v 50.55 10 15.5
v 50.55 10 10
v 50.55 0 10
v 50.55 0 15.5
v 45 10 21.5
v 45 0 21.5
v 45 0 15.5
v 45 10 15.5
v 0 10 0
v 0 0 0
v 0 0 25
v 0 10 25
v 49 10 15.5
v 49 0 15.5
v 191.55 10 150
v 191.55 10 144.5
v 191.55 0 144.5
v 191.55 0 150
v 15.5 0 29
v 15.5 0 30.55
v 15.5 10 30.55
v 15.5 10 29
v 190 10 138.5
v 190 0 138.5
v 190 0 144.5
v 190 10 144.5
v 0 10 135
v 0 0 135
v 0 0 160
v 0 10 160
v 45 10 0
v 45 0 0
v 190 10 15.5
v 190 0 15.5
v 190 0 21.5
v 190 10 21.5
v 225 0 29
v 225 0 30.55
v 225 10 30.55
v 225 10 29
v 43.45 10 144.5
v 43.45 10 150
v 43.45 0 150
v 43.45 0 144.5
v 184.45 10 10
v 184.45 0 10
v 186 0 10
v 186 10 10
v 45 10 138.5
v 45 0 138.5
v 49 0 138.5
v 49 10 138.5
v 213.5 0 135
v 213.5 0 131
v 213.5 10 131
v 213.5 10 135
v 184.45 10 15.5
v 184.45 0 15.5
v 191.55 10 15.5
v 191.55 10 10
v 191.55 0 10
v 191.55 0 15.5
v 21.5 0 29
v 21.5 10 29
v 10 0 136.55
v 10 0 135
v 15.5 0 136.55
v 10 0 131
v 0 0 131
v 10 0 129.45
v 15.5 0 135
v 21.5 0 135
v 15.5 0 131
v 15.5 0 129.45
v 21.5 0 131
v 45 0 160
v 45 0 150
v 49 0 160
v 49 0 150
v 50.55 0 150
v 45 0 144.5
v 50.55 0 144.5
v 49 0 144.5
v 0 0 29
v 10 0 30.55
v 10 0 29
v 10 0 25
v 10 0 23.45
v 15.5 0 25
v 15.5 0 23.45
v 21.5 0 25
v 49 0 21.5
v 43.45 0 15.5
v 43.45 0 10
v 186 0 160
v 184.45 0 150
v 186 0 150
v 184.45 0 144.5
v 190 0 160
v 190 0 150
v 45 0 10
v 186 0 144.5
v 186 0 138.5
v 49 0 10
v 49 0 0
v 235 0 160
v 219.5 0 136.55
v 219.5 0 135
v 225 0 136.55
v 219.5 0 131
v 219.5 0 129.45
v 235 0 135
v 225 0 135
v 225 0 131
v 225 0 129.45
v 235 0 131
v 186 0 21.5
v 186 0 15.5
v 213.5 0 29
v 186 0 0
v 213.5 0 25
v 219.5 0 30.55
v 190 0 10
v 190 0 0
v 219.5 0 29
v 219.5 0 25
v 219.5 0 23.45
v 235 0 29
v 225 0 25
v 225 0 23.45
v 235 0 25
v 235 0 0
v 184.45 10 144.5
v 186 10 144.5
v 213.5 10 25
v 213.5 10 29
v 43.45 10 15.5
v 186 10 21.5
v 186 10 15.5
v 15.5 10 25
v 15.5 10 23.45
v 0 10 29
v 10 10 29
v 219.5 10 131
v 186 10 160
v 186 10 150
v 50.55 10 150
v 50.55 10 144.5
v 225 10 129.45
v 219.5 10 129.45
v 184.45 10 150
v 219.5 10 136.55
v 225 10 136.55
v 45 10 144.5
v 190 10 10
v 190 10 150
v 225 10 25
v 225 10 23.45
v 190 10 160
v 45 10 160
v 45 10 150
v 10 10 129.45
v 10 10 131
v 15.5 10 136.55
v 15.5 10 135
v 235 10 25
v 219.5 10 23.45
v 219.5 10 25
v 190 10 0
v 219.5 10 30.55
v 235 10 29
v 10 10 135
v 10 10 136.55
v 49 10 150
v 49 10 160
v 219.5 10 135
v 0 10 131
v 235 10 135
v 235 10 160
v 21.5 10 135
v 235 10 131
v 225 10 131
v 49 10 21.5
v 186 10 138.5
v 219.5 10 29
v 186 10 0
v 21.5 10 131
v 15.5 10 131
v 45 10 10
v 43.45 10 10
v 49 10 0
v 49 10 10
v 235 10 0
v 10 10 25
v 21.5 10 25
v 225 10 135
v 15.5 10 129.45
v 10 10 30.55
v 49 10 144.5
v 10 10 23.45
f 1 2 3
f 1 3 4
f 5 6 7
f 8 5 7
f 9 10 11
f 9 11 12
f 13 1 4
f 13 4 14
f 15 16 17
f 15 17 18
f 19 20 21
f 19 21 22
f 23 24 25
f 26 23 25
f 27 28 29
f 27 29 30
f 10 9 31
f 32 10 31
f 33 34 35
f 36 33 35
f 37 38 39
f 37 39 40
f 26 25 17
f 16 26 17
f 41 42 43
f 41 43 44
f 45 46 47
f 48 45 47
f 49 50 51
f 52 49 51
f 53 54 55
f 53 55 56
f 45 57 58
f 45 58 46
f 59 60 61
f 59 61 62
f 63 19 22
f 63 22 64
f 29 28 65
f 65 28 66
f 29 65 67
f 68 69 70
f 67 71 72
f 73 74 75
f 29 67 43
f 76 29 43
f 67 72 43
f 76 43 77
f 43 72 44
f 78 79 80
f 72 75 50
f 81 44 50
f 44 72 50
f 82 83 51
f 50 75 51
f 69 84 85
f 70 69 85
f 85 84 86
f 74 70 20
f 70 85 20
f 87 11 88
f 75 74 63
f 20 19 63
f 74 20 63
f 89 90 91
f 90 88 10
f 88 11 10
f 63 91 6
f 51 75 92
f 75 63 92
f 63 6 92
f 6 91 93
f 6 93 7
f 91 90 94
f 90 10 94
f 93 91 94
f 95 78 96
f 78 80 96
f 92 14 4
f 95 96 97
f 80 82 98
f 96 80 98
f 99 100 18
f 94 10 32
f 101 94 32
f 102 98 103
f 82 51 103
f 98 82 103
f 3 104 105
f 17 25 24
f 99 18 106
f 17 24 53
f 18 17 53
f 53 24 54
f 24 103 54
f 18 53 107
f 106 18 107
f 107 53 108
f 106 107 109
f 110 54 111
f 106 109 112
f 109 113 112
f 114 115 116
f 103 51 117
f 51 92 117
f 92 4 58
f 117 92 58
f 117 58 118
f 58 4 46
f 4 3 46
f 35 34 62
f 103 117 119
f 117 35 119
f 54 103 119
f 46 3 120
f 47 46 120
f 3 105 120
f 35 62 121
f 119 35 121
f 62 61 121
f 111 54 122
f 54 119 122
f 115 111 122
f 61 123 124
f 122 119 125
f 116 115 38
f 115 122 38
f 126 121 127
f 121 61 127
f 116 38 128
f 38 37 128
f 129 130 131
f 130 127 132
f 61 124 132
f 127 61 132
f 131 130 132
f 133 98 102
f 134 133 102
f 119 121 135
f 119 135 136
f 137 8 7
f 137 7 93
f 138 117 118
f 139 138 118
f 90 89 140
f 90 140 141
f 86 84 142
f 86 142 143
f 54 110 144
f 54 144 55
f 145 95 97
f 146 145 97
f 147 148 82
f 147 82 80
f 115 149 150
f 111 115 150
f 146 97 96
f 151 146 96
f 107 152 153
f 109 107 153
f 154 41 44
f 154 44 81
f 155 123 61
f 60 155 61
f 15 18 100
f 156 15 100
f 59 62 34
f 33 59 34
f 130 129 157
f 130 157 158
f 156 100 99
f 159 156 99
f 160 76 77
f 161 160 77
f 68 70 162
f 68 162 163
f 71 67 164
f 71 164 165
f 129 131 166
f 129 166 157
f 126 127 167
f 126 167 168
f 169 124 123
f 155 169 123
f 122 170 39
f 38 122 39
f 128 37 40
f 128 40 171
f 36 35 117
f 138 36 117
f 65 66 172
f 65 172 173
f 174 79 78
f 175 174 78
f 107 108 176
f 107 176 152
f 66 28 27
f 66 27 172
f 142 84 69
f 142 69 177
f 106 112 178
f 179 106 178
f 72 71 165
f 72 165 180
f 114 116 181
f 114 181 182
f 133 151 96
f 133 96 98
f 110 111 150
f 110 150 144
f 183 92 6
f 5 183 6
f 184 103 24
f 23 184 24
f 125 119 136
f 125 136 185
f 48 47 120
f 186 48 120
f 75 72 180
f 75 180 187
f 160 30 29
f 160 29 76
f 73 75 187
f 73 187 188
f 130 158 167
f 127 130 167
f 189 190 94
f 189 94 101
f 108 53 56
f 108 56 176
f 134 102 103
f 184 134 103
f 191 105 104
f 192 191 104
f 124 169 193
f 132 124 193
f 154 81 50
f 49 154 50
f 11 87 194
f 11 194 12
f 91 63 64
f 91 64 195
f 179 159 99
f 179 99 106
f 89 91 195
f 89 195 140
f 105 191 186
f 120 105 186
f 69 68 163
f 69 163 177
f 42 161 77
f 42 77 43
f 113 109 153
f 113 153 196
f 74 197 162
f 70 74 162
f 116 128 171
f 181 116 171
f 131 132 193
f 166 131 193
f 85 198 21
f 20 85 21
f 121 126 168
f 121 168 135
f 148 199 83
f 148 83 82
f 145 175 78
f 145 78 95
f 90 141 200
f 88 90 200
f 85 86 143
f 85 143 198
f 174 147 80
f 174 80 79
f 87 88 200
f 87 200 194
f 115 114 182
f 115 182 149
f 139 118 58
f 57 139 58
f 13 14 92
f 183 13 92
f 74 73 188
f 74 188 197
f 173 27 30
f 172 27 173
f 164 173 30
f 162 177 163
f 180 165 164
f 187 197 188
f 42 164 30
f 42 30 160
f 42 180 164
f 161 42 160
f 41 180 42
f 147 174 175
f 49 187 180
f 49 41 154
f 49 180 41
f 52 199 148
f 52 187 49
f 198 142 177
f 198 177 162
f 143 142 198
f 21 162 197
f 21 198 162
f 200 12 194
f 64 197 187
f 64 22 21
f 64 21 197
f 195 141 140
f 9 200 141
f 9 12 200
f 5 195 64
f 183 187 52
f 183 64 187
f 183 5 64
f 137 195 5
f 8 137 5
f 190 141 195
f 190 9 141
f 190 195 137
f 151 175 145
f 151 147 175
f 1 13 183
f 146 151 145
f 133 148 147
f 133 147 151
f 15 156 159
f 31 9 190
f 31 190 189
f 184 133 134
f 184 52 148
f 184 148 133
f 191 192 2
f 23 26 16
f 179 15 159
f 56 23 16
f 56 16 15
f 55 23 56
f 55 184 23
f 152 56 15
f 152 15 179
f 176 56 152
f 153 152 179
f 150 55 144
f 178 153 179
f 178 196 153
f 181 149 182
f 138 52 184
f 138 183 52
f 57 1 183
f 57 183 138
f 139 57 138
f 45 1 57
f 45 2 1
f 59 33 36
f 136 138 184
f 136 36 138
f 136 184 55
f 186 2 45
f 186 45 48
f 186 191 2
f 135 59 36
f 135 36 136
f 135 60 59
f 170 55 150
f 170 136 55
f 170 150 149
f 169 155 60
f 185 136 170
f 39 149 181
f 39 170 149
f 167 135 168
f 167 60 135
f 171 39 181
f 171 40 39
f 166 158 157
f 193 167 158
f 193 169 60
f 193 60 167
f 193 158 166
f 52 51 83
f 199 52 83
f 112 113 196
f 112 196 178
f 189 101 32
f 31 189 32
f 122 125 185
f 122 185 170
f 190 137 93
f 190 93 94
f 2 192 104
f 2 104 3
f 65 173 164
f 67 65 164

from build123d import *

# Parameters (mm, degrees)
SKETCH1_W               = 235
SKETCH1_H               = 10
BOSS_EXTRUDE1_DEPTH     = 160
ENL_V_MAT_EXTRU_2_DEPTH = 10
ENL_V_MAT_EXTRU_3_DEPTH = 10


with BuildPart() as part:
    # Sketch1 → Boss-Extrude1 (new body)
    with BuildSketch(Plane.XY):
        with Locations((117.5, 5)):
            Rectangle(SKETCH1_W, SKETCH1_H)
    extrude(amount=BOSS_EXTRUDE1_DEPTH)

    # Esquisse2 → Enlèv. mat.-Extru.2 (cut)
    with BuildSketch(Plane.XZ):
        Polygon((0, 135), (10, 135), (10, 136.55), (15.5, 136.55), (15.5, 135), (21.5, 135), (21.5, 131), (15.5, 131), (15.5, 129.45), (10, 129.45), (10, 131), (0, 131), align=None)
        Polygon((0, 29), (10, 29), (10, 30.55), (15.5, 30.55), (15.5, 29), (21.5, 29), (21.5, 25), (15.5, 25), (15.5, 23.45), (10, 23.45), (10, 25), (0, 25), align=None)
        Polygon((235, 25), (225, 25), (225, 23.45), (219.5, 23.45), (219.5, 25), (213.5, 25), (213.5, 29), (219.5, 29), (219.5, 30.55), (225, 30.55), (225, 29), (235, 29), align=None)
        Polygon((235, 131), (225, 131), (225, 129.45), (219.5, 129.45), (219.5, 131), (213.5, 131), (213.5, 135), (219.5, 135), (219.5, 136.55), (225, 136.55), (225, 135), (235, 135), align=None)
    extrude(amount=-ENL_V_MAT_EXTRU_2_DEPTH, mode=Mode.SUBTRACT)

    # Esquisse3 → Enlèv. mat.-Extru.3 (cut)
    with BuildSketch(Plane.XZ):
        Polygon((45, 160), (45, 150), (43.45, 150), (43.45, 144.5), (45, 144.5), (45, 138.5), (49, 138.5), (49, 144.5), (50.55, 144.5), (50.55, 150), (49, 150), (49, 160), align=None)
        Polygon((186, 160), (186, 150), (184.45, 150), (184.45, 144.5), (186, 144.5), (186, 138.5), (190, 138.5), (190, 144.5), (191.55, 144.5), (191.55, 150), (190, 150), (190, 160), align=None)
        Polygon((190, 0), (190, 10), (191.55, 10), (191.55, 15.5), (190, 15.5), (190, 21.5), (186, 21.5), (186, 15.5), (184.45, 15.5), (184.45, 10), (186, 10), (186, 0), align=None)
        Polygon((49, 0), (49, 10), (50.55, 10), (50.55, 15.5), (49, 15.5), (49, 21.5), (45, 21.5), (45, 15.5), (43.45, 15.5), (43.45, 10), (45, 10), (45, 0), align=None)
    extrude(amount=-ENL_V_MAT_EXTRU_3_DEPTH, mode=Mode.SUBTRACT)


solid = part.part
